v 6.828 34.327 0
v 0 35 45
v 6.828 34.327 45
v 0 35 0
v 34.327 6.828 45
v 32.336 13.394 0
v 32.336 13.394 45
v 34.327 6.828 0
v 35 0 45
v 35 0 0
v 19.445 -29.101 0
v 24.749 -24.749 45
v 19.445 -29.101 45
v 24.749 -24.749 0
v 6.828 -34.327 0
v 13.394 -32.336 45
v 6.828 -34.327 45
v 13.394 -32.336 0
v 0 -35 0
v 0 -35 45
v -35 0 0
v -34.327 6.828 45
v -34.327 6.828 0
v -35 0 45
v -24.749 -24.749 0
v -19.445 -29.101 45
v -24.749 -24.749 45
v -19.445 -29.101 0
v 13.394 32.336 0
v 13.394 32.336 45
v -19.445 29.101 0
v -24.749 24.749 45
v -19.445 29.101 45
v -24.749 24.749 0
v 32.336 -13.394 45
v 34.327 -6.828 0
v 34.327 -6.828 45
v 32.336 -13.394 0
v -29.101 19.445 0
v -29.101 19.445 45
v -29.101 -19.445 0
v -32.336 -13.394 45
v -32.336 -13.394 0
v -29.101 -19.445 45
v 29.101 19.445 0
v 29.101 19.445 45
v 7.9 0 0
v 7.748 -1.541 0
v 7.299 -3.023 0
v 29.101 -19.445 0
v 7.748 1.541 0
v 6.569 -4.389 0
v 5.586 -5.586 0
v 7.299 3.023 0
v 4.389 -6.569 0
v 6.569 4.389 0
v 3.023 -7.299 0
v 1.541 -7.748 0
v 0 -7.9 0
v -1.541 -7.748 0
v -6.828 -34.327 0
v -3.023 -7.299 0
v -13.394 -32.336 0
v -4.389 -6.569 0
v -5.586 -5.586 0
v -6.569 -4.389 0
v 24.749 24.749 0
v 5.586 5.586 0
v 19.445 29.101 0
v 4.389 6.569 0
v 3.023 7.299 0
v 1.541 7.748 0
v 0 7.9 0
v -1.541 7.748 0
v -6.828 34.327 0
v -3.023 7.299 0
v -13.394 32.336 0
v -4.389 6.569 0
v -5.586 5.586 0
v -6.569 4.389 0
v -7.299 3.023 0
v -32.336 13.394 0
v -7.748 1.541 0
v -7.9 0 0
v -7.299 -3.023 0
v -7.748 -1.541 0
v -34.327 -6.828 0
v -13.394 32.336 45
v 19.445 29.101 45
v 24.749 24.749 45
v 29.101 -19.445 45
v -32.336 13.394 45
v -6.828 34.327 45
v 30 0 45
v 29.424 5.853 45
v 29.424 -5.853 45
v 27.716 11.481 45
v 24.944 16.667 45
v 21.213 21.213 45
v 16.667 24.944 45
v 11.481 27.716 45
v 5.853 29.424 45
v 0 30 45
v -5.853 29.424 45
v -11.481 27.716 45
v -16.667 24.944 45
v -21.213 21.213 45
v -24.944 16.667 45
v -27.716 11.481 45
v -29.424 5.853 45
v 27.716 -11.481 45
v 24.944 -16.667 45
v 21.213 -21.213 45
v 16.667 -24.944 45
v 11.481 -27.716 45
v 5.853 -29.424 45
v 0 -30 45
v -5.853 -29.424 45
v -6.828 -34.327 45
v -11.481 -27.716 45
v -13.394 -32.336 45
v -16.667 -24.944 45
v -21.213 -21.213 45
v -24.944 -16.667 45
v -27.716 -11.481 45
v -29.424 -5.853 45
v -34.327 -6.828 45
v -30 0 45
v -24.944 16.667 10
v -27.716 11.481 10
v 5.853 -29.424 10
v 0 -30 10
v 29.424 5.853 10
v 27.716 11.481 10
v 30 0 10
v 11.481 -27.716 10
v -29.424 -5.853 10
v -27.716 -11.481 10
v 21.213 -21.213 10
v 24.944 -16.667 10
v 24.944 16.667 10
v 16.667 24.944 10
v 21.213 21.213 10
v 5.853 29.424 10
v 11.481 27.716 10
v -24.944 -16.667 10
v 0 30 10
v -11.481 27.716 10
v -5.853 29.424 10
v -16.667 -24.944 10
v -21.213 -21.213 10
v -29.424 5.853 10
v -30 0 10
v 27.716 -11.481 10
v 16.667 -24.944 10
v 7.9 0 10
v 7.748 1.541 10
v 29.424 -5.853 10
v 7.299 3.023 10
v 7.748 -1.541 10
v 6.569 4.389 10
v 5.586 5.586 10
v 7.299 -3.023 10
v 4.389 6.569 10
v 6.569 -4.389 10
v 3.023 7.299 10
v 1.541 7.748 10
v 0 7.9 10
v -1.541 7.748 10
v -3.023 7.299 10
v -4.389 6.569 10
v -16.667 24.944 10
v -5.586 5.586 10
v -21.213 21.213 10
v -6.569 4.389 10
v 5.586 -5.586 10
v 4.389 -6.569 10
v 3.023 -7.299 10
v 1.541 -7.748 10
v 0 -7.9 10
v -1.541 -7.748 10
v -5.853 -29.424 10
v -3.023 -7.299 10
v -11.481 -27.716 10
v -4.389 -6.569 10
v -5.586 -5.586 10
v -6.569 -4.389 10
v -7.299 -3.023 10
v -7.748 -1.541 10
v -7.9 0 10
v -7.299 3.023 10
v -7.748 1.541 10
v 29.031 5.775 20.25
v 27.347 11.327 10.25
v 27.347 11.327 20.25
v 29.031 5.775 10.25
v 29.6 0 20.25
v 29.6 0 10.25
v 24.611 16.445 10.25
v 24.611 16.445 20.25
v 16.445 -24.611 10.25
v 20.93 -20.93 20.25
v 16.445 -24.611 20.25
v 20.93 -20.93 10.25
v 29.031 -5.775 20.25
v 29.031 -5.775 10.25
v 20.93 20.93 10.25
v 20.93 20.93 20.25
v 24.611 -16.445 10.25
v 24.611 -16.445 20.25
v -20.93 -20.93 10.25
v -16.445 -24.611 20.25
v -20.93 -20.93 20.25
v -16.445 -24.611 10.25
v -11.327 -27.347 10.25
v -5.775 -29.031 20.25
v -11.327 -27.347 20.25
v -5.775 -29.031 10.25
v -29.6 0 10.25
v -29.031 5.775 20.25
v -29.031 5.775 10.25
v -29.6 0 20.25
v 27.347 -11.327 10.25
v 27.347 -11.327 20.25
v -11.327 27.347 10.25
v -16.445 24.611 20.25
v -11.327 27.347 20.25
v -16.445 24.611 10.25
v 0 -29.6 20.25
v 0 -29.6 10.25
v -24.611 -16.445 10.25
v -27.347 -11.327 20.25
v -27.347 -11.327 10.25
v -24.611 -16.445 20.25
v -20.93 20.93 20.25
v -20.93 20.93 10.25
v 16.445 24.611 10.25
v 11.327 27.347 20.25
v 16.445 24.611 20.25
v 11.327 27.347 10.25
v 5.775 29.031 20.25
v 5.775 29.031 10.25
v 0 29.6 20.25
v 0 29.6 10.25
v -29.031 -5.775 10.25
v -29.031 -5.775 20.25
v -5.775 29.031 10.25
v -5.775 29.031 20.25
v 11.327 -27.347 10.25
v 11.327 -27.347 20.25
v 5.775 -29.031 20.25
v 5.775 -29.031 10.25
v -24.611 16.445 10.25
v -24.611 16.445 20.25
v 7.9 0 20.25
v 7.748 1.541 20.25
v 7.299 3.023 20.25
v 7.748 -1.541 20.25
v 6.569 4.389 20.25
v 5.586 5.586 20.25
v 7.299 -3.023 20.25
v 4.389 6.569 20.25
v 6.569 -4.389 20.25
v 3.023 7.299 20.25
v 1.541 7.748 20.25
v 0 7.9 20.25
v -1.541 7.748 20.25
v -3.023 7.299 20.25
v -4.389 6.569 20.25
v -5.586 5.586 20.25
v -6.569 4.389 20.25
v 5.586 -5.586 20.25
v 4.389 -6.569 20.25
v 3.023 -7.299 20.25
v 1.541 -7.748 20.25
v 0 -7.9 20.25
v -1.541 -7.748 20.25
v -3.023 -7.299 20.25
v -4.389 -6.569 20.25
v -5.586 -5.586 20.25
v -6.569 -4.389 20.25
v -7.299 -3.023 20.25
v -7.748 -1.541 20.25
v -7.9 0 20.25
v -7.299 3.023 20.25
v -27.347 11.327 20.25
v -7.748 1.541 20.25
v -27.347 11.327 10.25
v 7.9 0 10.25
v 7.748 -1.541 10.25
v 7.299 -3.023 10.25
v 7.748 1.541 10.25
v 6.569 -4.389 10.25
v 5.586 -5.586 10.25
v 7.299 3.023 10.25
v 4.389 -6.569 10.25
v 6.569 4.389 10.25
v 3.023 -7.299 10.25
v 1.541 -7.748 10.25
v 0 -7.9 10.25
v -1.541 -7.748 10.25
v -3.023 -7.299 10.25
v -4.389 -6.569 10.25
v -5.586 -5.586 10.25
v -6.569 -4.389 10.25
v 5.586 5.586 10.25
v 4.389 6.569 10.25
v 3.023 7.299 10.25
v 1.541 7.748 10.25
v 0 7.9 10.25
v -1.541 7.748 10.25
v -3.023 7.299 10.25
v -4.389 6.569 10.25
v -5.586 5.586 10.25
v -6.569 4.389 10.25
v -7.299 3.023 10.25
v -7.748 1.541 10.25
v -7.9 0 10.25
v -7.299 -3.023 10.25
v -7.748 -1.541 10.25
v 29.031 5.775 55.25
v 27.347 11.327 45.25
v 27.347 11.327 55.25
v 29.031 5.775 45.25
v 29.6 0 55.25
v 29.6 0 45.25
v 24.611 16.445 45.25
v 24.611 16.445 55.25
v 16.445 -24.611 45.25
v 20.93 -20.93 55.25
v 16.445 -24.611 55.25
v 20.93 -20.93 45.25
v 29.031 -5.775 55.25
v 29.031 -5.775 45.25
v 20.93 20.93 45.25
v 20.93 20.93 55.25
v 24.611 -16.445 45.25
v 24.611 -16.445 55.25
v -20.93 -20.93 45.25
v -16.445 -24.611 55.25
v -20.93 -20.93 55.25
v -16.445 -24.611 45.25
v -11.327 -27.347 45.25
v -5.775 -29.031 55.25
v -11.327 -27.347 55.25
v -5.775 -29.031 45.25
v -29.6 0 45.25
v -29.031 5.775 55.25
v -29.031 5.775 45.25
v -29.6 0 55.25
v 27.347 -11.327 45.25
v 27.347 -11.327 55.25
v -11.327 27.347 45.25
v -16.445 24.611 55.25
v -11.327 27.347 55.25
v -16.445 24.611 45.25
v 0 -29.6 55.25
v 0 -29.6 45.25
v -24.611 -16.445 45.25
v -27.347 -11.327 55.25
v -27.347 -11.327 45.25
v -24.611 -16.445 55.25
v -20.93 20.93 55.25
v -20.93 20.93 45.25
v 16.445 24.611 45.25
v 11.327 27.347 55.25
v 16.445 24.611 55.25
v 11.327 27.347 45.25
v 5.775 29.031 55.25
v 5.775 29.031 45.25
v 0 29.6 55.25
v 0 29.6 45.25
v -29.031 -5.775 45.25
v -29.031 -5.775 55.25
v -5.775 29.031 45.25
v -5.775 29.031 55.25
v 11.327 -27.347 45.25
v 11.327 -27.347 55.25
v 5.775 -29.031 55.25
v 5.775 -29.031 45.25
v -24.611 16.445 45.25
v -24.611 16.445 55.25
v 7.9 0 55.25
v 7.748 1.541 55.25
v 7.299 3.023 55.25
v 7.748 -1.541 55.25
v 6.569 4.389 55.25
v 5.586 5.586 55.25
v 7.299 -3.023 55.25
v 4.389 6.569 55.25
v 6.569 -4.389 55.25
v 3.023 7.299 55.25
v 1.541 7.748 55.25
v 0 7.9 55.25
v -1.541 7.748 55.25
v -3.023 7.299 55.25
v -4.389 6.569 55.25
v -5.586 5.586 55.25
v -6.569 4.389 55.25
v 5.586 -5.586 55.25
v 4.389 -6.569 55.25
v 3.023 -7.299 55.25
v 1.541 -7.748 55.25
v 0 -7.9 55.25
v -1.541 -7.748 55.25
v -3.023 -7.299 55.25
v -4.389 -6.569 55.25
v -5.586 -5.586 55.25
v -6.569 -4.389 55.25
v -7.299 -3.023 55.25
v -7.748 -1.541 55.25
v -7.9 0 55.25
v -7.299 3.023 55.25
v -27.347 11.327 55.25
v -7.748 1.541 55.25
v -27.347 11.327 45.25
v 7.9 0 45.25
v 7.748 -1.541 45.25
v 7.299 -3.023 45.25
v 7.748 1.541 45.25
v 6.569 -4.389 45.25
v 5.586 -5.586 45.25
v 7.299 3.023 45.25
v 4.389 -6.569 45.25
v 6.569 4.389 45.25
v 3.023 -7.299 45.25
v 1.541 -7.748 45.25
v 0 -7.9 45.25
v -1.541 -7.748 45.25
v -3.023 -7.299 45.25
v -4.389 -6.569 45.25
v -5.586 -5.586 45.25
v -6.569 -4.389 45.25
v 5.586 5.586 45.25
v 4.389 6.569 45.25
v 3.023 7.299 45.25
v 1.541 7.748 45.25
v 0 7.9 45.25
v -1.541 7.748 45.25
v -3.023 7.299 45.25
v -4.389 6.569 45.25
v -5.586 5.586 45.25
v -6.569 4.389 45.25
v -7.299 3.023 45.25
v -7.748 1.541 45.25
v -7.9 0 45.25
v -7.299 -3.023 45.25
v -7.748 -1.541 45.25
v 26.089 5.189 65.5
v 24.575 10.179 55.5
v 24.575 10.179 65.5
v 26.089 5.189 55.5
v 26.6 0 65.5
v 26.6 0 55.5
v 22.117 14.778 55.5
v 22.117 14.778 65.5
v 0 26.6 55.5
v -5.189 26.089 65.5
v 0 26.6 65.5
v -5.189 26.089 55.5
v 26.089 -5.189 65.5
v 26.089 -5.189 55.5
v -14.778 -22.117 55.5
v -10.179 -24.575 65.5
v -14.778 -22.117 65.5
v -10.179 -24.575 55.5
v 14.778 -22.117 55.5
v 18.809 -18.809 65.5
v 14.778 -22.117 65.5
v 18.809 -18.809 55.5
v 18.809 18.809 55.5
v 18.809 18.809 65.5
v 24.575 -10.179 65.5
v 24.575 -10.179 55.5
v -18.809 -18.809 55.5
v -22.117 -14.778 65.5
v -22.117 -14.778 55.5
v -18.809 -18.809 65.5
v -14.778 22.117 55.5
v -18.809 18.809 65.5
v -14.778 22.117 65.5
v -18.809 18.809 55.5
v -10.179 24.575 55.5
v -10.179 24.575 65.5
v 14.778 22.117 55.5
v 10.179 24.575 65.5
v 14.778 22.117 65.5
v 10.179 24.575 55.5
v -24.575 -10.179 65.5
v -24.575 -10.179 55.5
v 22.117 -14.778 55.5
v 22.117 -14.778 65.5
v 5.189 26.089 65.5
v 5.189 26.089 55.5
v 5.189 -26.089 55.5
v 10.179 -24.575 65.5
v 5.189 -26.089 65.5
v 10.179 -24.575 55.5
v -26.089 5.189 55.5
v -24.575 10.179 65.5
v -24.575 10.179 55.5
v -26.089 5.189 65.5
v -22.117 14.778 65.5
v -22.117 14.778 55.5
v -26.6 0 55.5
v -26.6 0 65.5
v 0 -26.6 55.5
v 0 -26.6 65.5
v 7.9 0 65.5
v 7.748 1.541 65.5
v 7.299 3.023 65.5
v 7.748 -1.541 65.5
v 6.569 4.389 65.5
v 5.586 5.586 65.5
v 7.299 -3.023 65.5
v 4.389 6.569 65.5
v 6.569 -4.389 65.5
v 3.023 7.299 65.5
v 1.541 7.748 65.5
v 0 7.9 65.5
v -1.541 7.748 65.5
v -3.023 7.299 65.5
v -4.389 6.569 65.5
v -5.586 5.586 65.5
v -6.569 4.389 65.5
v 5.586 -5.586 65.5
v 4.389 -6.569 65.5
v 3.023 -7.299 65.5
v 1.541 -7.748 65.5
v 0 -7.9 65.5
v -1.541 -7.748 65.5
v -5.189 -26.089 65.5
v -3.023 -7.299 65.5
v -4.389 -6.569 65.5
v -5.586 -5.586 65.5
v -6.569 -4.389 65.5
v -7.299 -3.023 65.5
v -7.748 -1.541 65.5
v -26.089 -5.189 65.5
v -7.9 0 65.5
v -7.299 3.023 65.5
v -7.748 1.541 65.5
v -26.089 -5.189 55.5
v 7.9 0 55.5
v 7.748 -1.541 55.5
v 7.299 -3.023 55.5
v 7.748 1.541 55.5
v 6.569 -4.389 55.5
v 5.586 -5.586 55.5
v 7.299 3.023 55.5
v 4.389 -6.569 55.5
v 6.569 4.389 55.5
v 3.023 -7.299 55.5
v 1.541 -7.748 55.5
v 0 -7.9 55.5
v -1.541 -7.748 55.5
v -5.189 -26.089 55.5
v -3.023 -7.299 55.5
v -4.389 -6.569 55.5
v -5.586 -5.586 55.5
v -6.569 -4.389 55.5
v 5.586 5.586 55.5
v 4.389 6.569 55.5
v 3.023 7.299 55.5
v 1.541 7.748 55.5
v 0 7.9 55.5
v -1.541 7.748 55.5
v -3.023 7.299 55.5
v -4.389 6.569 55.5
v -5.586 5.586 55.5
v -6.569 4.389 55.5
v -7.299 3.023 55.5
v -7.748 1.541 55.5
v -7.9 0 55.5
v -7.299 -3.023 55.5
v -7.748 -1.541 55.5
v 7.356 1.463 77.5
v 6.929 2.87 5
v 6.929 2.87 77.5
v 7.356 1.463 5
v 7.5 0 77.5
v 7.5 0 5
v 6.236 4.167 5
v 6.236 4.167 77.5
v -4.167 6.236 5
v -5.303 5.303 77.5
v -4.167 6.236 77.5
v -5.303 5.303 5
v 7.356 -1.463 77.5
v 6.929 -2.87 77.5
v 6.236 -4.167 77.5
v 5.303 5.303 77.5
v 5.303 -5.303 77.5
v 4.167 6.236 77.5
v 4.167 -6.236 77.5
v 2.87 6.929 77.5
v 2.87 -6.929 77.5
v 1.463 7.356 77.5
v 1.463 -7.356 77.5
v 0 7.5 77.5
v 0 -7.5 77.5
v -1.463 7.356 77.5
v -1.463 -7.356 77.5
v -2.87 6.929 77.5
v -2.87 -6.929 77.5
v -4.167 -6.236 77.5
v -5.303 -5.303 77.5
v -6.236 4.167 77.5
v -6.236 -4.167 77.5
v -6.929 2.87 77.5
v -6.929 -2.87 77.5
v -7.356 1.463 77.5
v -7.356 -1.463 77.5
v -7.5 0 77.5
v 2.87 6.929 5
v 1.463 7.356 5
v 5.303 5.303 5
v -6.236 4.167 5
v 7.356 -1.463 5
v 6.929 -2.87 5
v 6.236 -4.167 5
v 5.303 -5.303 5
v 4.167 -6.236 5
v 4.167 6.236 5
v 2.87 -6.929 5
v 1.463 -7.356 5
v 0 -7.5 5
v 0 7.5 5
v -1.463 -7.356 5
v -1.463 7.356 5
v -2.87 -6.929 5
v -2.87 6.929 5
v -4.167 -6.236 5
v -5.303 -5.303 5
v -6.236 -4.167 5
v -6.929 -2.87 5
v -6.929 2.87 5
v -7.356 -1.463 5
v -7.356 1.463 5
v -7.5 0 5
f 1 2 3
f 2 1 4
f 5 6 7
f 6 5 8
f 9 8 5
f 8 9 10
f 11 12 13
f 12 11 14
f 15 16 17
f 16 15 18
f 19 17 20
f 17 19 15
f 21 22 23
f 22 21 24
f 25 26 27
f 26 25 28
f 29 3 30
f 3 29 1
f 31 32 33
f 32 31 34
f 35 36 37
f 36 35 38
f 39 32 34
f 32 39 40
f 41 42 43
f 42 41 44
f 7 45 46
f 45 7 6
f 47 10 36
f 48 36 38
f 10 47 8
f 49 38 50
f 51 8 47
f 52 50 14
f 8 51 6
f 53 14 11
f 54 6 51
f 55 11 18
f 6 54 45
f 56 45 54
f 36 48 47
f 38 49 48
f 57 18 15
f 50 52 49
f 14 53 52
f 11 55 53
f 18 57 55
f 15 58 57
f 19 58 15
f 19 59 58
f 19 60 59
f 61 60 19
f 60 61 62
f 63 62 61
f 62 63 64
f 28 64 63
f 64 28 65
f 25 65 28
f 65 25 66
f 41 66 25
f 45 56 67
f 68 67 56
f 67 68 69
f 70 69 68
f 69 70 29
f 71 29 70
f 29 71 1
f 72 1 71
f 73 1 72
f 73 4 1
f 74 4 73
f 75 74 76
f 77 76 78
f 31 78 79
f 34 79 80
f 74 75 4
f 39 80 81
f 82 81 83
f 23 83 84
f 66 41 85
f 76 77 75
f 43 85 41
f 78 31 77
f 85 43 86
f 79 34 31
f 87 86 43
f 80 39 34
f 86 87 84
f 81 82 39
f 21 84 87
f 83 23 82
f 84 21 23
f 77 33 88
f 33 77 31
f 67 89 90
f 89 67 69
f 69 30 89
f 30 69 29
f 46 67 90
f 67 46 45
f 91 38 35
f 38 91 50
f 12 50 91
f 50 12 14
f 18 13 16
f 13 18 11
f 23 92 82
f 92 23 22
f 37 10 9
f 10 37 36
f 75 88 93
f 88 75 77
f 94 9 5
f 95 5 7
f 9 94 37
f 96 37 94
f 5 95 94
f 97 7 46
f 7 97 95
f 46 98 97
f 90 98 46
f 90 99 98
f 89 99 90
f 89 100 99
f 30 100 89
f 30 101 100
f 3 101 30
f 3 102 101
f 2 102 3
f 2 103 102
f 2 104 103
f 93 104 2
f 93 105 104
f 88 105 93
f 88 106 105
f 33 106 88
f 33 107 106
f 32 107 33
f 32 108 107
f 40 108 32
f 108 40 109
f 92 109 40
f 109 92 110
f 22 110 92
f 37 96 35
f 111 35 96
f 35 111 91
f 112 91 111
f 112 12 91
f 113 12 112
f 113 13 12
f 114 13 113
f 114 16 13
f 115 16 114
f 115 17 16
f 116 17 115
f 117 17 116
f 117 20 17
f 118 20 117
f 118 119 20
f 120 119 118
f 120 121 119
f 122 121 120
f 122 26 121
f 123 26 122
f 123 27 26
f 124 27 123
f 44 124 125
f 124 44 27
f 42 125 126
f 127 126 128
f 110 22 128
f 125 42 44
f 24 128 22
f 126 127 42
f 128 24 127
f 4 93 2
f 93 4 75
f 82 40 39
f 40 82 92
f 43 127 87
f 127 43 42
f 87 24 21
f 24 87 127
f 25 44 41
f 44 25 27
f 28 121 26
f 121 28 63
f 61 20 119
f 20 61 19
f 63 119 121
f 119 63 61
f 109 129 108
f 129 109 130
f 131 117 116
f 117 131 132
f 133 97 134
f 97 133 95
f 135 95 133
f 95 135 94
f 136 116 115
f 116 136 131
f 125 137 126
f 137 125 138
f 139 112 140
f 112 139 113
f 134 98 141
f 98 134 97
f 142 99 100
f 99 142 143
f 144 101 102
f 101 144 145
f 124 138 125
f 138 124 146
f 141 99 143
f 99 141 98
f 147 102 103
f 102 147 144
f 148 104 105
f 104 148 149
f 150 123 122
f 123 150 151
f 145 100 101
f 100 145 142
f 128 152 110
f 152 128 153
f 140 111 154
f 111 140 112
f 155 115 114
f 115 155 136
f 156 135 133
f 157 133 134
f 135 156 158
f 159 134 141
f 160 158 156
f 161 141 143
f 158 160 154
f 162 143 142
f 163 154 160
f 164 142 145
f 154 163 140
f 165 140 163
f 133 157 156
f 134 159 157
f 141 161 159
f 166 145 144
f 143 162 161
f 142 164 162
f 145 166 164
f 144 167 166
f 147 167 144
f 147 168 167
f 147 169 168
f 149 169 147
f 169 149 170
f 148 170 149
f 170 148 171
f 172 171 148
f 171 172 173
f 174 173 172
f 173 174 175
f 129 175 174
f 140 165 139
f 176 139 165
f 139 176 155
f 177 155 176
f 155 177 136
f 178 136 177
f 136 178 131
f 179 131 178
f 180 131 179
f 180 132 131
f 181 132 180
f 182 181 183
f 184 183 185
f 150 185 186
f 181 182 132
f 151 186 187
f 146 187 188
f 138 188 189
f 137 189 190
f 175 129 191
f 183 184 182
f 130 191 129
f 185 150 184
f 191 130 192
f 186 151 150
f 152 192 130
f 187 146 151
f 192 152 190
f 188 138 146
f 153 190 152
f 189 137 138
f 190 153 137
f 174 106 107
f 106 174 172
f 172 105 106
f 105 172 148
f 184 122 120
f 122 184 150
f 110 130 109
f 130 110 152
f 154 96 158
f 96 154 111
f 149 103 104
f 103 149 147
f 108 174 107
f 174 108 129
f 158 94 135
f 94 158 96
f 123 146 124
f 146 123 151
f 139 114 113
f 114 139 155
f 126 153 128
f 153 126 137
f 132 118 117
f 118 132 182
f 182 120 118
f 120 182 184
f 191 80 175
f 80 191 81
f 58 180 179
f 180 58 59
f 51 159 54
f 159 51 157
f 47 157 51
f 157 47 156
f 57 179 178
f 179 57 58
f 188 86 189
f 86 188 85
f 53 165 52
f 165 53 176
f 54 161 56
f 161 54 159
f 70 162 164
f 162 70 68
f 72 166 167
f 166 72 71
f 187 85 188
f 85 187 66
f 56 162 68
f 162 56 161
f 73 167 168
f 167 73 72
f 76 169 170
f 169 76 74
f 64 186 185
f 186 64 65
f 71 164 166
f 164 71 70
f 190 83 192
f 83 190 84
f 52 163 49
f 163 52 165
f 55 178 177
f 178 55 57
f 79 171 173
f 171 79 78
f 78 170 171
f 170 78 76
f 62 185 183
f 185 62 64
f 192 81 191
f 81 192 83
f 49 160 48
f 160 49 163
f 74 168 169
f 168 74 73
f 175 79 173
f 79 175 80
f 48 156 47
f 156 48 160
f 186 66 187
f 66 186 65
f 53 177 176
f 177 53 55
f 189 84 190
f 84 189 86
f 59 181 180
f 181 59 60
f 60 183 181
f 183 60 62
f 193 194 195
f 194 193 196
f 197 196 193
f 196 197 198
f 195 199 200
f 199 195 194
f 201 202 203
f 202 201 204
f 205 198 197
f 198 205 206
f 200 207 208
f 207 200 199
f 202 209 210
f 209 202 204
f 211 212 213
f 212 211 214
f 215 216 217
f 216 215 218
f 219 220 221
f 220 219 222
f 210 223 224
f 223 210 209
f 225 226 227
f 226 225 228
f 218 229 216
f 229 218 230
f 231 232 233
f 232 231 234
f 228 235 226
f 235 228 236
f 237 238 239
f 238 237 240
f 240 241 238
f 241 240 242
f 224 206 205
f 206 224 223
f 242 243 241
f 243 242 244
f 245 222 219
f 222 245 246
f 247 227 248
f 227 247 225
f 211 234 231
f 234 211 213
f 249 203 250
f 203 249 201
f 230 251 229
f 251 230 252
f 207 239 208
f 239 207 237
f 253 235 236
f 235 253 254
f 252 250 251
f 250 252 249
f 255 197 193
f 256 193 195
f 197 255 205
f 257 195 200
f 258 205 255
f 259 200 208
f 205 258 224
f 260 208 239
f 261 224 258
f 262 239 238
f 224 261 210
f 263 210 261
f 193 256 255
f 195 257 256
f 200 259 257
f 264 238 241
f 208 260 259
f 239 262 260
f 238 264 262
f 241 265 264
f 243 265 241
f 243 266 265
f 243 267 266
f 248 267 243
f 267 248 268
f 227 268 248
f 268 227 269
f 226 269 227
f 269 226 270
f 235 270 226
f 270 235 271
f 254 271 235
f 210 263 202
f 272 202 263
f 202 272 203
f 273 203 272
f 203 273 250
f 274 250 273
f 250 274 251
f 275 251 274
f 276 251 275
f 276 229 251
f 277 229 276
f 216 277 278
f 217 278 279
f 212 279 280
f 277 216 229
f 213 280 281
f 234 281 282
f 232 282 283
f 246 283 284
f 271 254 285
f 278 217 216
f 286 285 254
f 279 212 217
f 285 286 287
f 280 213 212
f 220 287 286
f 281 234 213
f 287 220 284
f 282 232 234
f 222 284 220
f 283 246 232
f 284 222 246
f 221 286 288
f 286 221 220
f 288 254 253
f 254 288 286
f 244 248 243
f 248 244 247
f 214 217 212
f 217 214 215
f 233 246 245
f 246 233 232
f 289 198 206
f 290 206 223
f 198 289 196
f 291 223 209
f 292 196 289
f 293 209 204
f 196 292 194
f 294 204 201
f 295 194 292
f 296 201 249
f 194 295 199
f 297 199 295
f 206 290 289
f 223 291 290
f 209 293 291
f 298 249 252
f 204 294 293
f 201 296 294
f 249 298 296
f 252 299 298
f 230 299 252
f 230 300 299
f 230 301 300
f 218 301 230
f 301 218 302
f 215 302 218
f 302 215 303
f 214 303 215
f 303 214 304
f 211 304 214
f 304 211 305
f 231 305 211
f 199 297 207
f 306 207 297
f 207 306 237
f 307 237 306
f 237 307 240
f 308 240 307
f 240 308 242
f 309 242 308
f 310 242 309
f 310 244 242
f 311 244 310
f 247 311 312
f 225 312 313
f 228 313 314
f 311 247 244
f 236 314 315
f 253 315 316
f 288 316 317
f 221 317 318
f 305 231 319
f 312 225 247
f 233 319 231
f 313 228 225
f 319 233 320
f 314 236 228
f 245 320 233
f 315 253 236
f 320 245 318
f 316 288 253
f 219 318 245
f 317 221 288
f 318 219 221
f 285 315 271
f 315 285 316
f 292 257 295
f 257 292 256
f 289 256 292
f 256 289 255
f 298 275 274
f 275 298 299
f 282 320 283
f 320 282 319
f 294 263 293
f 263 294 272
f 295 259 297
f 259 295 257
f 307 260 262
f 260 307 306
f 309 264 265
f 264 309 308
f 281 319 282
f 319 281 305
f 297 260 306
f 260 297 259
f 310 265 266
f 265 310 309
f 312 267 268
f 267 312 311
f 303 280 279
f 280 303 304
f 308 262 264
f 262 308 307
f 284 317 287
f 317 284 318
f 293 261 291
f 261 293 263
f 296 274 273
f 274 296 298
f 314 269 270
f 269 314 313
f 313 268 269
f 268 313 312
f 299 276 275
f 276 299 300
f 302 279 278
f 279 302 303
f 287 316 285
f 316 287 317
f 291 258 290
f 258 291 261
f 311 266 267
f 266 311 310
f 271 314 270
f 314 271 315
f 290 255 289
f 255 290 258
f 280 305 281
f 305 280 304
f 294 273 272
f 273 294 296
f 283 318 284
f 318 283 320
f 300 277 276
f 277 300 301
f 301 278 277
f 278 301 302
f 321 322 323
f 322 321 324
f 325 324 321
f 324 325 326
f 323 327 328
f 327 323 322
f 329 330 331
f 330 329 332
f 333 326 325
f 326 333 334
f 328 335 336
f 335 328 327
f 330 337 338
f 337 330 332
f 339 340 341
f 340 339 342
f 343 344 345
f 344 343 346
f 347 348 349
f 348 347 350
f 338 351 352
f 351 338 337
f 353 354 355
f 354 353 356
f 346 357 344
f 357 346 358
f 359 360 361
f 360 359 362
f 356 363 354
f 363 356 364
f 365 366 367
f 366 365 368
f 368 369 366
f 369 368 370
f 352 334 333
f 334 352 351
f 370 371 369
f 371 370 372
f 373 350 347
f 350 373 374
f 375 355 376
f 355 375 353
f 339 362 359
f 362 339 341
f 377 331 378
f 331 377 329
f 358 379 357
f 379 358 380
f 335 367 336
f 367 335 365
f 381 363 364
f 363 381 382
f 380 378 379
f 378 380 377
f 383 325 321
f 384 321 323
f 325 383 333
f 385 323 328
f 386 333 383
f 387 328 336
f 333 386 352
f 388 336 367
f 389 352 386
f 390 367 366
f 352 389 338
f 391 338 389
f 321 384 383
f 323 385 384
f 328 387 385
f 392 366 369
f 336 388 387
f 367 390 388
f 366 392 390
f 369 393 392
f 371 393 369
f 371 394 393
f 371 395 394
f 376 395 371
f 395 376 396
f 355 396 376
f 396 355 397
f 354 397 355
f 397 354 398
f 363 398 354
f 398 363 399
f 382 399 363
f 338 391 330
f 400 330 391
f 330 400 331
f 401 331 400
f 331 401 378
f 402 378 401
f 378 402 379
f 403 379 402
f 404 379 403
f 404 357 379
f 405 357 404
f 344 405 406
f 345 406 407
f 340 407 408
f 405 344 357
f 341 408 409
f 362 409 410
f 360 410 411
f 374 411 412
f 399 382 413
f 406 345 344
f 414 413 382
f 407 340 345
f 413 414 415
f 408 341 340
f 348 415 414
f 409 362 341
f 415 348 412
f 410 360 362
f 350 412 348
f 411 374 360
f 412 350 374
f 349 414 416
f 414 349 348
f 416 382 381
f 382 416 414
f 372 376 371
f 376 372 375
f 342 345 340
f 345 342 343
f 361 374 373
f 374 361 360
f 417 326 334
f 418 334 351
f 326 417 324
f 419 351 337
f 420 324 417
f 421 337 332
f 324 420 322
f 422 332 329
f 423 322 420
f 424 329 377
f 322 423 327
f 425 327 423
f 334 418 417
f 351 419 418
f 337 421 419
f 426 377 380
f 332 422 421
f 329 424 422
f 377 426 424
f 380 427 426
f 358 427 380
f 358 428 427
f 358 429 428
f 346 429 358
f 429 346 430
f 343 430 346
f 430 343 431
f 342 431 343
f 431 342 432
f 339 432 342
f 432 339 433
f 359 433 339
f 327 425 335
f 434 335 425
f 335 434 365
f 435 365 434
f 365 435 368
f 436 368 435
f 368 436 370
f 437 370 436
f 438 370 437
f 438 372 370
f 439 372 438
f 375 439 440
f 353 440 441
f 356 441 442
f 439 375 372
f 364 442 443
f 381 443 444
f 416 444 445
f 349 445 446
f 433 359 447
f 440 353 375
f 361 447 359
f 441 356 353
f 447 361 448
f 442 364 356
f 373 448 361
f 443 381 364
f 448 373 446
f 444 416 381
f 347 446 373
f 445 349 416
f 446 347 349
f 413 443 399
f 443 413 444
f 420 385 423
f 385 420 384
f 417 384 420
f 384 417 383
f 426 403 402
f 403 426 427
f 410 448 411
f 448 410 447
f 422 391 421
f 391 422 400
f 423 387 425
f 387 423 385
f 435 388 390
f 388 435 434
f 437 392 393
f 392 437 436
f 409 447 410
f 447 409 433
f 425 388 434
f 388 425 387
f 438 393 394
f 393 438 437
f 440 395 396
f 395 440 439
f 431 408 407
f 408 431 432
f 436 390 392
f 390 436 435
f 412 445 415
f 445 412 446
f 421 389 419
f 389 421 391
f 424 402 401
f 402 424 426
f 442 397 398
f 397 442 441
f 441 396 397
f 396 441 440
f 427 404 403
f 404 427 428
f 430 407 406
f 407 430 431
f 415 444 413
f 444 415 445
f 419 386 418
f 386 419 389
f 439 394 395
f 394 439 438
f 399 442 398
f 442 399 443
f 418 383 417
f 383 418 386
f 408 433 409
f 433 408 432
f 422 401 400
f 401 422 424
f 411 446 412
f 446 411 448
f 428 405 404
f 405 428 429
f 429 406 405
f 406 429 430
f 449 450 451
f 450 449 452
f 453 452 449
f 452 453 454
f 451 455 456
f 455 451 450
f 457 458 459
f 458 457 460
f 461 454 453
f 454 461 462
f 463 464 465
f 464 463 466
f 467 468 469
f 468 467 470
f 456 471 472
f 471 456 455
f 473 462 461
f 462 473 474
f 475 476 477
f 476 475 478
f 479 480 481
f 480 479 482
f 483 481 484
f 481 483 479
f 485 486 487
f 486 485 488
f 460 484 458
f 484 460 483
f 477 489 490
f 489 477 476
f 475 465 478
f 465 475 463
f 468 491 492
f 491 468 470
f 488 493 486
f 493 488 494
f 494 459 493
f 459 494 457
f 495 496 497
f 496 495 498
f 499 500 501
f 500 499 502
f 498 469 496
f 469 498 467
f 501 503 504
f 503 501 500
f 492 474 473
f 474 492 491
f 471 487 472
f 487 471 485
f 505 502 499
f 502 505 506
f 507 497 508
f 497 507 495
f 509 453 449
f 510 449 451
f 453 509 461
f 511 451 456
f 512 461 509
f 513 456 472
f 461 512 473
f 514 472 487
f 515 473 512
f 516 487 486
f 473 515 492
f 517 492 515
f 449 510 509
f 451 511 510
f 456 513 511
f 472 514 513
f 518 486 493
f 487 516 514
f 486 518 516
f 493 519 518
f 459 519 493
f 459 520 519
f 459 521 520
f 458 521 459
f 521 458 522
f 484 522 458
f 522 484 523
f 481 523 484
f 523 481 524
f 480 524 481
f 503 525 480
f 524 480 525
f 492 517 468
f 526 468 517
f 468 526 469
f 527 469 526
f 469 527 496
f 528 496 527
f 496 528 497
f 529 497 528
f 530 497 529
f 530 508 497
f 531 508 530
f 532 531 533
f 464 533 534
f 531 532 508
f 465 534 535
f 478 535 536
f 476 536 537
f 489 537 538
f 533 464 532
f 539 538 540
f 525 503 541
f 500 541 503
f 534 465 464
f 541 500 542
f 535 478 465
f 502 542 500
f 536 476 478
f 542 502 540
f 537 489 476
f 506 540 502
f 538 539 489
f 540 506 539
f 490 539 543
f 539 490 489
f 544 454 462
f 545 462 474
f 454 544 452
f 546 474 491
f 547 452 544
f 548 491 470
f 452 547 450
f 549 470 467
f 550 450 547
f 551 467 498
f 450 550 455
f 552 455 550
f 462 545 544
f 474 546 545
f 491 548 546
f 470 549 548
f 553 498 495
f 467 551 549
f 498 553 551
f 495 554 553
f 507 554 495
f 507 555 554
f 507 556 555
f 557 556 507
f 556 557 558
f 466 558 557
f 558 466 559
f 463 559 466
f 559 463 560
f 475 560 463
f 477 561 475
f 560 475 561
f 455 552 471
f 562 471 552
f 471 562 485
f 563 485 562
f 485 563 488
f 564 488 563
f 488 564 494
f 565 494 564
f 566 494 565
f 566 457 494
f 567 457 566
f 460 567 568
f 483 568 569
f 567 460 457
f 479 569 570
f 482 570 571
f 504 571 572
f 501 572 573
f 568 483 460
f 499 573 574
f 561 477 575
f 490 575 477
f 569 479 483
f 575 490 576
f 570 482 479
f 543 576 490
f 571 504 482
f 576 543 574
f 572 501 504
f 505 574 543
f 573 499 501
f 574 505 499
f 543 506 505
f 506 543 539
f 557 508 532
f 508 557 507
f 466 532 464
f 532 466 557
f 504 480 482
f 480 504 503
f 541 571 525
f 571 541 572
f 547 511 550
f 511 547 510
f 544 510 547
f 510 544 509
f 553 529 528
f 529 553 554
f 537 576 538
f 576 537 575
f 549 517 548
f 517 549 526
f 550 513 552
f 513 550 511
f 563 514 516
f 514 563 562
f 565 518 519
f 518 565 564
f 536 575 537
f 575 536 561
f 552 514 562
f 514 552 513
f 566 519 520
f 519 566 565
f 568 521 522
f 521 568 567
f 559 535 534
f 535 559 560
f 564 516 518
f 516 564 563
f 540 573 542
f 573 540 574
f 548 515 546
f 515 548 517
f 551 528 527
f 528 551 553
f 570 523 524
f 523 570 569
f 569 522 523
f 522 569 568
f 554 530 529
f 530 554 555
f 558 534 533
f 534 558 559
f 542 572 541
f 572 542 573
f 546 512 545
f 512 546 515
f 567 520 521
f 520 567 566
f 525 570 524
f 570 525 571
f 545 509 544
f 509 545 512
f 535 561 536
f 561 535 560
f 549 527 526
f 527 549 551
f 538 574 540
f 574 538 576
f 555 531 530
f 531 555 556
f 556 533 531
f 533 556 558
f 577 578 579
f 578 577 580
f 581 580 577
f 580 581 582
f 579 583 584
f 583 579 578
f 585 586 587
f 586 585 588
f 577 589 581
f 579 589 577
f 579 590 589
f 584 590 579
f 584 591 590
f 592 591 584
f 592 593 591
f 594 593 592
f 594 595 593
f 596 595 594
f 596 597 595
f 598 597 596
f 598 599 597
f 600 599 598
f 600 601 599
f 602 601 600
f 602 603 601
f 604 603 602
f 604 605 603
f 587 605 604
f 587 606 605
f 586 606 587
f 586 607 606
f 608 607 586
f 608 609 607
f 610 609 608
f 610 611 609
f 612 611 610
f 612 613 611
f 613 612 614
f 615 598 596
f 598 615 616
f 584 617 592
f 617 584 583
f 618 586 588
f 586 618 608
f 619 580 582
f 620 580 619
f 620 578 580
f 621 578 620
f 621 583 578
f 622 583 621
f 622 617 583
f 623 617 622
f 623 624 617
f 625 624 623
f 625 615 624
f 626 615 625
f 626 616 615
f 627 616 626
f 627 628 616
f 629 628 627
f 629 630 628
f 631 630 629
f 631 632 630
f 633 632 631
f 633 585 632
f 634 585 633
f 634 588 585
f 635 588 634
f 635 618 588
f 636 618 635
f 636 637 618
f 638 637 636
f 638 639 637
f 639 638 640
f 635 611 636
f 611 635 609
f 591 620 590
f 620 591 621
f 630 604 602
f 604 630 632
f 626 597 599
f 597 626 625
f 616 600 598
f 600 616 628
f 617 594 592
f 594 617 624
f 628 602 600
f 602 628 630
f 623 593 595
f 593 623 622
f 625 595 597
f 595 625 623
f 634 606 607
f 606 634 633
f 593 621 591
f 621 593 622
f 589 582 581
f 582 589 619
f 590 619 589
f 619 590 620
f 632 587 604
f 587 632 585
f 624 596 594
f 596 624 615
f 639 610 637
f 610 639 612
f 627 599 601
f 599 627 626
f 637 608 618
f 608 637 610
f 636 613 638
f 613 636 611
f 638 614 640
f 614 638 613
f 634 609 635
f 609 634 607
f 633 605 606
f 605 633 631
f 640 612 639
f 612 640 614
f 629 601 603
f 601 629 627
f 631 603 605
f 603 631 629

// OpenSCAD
$fn = 32;

// ------------------------------------------------------------------------
// Bearing housing: housing d70, two bearings and a shaft
// Every part is its own module, assembly() places them once.
// ------------------------------------------------------------------------

// --- part 1 ---
module housing() {
  difference() {
    cylinder(h = 45, d = 70);
    translate([0, 0, 10]) cylinder(h = 36, d = 60);
    translate([0, 0, -1]) cylinder(h = 12, d = 15.8);
  }
}

// --- part 2 ---
module bearing_lower() {
  difference() {
      translate([0, 0, 0]) cylinder(h = 10, d = 59.2);
      translate([0, 0, -1]) cylinder(h = 12, d = 15.8);
    }
}

// --- part 3 ---
module bearing_upper() {
  difference() {
      translate([0, 0, 0]) cylinder(h = 10, d = 59.2);
      translate([0, 0, -1]) cylinder(h = 12, d = 15.8);
    }
}

// --- part 4 ---
module spacer() {
  difference() {
      translate([0, 0, 0]) cylinder(h = 10, d = 53.2);
      translate([0, 0, -1]) cylinder(h = 12, d = 15.8);
    }
}

// --- part 5 ---
module shaft() {
  translate([0, 0, -36.25]) cylinder(h = 72.5, d = 15);
}

// --- assembly ---
module assembly() {
  translate([0, 0, 0]) rotate([0, 0, 0]) housing();
  translate([0, 0, 10.25]) rotate([0, 0, 0]) bearing_lower();
  translate([0, 0, 45.25]) rotate([0, 0, 0]) bearing_upper();
  translate([0, 0, 55.5]) rotate([0, 0, 0]) spacer();
  translate([0, 0, 41.25]) rotate([0, 0, 0]) shaft();
}

assembly();
